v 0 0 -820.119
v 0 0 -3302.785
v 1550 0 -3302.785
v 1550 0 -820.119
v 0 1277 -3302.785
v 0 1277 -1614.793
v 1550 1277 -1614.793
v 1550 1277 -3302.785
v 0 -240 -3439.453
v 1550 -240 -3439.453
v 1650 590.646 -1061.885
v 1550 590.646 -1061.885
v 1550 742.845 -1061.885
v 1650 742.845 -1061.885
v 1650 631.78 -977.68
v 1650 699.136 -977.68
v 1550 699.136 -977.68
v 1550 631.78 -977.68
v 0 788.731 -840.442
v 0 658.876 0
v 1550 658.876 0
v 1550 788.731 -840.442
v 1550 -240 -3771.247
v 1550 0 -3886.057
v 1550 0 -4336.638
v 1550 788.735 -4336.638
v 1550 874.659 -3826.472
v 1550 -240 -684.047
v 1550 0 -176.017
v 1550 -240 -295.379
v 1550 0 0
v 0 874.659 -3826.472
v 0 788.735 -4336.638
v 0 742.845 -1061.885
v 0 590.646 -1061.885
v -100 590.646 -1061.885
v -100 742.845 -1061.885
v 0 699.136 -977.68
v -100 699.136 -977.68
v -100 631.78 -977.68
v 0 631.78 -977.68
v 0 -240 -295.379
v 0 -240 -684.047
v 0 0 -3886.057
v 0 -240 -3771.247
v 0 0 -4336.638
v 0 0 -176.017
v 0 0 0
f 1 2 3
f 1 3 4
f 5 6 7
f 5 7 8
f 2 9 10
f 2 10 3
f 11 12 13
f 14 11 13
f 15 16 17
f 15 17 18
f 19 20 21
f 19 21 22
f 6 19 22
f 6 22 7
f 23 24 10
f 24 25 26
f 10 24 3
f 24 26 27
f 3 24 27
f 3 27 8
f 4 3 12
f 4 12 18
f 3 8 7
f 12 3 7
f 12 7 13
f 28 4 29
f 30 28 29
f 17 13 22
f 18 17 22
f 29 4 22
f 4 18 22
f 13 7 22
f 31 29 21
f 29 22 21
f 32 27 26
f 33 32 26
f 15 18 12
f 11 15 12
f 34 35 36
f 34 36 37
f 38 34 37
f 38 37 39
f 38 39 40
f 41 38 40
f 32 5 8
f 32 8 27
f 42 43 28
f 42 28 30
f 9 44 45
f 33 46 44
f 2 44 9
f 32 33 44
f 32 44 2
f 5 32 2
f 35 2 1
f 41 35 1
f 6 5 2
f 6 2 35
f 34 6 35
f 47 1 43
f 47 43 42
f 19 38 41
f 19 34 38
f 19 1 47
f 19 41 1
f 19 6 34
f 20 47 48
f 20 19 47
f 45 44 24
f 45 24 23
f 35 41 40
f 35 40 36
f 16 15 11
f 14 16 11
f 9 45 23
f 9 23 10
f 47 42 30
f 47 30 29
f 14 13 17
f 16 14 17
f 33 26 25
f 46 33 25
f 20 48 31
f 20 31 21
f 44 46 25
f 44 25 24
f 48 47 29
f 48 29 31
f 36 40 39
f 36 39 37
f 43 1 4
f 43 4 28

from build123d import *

# Parameters (mm, degrees)
EXTRUDE_1_DEPTH      = 1550
EXTRUDE_2_DEPTH      = 100
EXTRUDE_2_DEPTH_BACK = 1650


with BuildPart() as part:
    # Эскиз1 → Бобышка-Вытянуть1 (new body)
    with BuildSketch(Plane(origin=(0, 0, 0), x_dir=(0, 0, -1), z_dir=(1, 0, 0))):
        Polygon((0, 0), (0, 658.87563872), (840.441792245, 788.73141871), (1614.79322398, 1277), (3302.785099296, 1277), (3826.472113363, 874.659150999), (4336.637717029, 788.734761174), (4336.637717029, 0), (3886.057467004, 0), (3771.246676393, -240), (3439.453351147, -240), (3302.785099296, 0), (820.119296538, 0), (684.047248406, -240), (295.379400048, -240), (176.017340053, 0), align=None)
    extrude(amount=EXTRUDE_1_DEPTH)

    # Эскиз2 → Бобышка-Вытянуть2 (add, two sides)
    with BuildSketch(Plane(origin=(1550, 0, 0), x_dir=(0, 0, -1), z_dir=(1, 0, 0))) as extrude_2_sk:
        Polygon((977.680000946, 699.13622092), (977.680000946, 631.780006551), (1061.885264707, 590.645631586), (1061.885264707, 742.845049311), align=None)
    extrude(amount=EXTRUDE_2_DEPTH)
    extrude(extrude_2_sk.sketch, amount=-EXTRUDE_2_DEPTH_BACK)


solid = part.part
